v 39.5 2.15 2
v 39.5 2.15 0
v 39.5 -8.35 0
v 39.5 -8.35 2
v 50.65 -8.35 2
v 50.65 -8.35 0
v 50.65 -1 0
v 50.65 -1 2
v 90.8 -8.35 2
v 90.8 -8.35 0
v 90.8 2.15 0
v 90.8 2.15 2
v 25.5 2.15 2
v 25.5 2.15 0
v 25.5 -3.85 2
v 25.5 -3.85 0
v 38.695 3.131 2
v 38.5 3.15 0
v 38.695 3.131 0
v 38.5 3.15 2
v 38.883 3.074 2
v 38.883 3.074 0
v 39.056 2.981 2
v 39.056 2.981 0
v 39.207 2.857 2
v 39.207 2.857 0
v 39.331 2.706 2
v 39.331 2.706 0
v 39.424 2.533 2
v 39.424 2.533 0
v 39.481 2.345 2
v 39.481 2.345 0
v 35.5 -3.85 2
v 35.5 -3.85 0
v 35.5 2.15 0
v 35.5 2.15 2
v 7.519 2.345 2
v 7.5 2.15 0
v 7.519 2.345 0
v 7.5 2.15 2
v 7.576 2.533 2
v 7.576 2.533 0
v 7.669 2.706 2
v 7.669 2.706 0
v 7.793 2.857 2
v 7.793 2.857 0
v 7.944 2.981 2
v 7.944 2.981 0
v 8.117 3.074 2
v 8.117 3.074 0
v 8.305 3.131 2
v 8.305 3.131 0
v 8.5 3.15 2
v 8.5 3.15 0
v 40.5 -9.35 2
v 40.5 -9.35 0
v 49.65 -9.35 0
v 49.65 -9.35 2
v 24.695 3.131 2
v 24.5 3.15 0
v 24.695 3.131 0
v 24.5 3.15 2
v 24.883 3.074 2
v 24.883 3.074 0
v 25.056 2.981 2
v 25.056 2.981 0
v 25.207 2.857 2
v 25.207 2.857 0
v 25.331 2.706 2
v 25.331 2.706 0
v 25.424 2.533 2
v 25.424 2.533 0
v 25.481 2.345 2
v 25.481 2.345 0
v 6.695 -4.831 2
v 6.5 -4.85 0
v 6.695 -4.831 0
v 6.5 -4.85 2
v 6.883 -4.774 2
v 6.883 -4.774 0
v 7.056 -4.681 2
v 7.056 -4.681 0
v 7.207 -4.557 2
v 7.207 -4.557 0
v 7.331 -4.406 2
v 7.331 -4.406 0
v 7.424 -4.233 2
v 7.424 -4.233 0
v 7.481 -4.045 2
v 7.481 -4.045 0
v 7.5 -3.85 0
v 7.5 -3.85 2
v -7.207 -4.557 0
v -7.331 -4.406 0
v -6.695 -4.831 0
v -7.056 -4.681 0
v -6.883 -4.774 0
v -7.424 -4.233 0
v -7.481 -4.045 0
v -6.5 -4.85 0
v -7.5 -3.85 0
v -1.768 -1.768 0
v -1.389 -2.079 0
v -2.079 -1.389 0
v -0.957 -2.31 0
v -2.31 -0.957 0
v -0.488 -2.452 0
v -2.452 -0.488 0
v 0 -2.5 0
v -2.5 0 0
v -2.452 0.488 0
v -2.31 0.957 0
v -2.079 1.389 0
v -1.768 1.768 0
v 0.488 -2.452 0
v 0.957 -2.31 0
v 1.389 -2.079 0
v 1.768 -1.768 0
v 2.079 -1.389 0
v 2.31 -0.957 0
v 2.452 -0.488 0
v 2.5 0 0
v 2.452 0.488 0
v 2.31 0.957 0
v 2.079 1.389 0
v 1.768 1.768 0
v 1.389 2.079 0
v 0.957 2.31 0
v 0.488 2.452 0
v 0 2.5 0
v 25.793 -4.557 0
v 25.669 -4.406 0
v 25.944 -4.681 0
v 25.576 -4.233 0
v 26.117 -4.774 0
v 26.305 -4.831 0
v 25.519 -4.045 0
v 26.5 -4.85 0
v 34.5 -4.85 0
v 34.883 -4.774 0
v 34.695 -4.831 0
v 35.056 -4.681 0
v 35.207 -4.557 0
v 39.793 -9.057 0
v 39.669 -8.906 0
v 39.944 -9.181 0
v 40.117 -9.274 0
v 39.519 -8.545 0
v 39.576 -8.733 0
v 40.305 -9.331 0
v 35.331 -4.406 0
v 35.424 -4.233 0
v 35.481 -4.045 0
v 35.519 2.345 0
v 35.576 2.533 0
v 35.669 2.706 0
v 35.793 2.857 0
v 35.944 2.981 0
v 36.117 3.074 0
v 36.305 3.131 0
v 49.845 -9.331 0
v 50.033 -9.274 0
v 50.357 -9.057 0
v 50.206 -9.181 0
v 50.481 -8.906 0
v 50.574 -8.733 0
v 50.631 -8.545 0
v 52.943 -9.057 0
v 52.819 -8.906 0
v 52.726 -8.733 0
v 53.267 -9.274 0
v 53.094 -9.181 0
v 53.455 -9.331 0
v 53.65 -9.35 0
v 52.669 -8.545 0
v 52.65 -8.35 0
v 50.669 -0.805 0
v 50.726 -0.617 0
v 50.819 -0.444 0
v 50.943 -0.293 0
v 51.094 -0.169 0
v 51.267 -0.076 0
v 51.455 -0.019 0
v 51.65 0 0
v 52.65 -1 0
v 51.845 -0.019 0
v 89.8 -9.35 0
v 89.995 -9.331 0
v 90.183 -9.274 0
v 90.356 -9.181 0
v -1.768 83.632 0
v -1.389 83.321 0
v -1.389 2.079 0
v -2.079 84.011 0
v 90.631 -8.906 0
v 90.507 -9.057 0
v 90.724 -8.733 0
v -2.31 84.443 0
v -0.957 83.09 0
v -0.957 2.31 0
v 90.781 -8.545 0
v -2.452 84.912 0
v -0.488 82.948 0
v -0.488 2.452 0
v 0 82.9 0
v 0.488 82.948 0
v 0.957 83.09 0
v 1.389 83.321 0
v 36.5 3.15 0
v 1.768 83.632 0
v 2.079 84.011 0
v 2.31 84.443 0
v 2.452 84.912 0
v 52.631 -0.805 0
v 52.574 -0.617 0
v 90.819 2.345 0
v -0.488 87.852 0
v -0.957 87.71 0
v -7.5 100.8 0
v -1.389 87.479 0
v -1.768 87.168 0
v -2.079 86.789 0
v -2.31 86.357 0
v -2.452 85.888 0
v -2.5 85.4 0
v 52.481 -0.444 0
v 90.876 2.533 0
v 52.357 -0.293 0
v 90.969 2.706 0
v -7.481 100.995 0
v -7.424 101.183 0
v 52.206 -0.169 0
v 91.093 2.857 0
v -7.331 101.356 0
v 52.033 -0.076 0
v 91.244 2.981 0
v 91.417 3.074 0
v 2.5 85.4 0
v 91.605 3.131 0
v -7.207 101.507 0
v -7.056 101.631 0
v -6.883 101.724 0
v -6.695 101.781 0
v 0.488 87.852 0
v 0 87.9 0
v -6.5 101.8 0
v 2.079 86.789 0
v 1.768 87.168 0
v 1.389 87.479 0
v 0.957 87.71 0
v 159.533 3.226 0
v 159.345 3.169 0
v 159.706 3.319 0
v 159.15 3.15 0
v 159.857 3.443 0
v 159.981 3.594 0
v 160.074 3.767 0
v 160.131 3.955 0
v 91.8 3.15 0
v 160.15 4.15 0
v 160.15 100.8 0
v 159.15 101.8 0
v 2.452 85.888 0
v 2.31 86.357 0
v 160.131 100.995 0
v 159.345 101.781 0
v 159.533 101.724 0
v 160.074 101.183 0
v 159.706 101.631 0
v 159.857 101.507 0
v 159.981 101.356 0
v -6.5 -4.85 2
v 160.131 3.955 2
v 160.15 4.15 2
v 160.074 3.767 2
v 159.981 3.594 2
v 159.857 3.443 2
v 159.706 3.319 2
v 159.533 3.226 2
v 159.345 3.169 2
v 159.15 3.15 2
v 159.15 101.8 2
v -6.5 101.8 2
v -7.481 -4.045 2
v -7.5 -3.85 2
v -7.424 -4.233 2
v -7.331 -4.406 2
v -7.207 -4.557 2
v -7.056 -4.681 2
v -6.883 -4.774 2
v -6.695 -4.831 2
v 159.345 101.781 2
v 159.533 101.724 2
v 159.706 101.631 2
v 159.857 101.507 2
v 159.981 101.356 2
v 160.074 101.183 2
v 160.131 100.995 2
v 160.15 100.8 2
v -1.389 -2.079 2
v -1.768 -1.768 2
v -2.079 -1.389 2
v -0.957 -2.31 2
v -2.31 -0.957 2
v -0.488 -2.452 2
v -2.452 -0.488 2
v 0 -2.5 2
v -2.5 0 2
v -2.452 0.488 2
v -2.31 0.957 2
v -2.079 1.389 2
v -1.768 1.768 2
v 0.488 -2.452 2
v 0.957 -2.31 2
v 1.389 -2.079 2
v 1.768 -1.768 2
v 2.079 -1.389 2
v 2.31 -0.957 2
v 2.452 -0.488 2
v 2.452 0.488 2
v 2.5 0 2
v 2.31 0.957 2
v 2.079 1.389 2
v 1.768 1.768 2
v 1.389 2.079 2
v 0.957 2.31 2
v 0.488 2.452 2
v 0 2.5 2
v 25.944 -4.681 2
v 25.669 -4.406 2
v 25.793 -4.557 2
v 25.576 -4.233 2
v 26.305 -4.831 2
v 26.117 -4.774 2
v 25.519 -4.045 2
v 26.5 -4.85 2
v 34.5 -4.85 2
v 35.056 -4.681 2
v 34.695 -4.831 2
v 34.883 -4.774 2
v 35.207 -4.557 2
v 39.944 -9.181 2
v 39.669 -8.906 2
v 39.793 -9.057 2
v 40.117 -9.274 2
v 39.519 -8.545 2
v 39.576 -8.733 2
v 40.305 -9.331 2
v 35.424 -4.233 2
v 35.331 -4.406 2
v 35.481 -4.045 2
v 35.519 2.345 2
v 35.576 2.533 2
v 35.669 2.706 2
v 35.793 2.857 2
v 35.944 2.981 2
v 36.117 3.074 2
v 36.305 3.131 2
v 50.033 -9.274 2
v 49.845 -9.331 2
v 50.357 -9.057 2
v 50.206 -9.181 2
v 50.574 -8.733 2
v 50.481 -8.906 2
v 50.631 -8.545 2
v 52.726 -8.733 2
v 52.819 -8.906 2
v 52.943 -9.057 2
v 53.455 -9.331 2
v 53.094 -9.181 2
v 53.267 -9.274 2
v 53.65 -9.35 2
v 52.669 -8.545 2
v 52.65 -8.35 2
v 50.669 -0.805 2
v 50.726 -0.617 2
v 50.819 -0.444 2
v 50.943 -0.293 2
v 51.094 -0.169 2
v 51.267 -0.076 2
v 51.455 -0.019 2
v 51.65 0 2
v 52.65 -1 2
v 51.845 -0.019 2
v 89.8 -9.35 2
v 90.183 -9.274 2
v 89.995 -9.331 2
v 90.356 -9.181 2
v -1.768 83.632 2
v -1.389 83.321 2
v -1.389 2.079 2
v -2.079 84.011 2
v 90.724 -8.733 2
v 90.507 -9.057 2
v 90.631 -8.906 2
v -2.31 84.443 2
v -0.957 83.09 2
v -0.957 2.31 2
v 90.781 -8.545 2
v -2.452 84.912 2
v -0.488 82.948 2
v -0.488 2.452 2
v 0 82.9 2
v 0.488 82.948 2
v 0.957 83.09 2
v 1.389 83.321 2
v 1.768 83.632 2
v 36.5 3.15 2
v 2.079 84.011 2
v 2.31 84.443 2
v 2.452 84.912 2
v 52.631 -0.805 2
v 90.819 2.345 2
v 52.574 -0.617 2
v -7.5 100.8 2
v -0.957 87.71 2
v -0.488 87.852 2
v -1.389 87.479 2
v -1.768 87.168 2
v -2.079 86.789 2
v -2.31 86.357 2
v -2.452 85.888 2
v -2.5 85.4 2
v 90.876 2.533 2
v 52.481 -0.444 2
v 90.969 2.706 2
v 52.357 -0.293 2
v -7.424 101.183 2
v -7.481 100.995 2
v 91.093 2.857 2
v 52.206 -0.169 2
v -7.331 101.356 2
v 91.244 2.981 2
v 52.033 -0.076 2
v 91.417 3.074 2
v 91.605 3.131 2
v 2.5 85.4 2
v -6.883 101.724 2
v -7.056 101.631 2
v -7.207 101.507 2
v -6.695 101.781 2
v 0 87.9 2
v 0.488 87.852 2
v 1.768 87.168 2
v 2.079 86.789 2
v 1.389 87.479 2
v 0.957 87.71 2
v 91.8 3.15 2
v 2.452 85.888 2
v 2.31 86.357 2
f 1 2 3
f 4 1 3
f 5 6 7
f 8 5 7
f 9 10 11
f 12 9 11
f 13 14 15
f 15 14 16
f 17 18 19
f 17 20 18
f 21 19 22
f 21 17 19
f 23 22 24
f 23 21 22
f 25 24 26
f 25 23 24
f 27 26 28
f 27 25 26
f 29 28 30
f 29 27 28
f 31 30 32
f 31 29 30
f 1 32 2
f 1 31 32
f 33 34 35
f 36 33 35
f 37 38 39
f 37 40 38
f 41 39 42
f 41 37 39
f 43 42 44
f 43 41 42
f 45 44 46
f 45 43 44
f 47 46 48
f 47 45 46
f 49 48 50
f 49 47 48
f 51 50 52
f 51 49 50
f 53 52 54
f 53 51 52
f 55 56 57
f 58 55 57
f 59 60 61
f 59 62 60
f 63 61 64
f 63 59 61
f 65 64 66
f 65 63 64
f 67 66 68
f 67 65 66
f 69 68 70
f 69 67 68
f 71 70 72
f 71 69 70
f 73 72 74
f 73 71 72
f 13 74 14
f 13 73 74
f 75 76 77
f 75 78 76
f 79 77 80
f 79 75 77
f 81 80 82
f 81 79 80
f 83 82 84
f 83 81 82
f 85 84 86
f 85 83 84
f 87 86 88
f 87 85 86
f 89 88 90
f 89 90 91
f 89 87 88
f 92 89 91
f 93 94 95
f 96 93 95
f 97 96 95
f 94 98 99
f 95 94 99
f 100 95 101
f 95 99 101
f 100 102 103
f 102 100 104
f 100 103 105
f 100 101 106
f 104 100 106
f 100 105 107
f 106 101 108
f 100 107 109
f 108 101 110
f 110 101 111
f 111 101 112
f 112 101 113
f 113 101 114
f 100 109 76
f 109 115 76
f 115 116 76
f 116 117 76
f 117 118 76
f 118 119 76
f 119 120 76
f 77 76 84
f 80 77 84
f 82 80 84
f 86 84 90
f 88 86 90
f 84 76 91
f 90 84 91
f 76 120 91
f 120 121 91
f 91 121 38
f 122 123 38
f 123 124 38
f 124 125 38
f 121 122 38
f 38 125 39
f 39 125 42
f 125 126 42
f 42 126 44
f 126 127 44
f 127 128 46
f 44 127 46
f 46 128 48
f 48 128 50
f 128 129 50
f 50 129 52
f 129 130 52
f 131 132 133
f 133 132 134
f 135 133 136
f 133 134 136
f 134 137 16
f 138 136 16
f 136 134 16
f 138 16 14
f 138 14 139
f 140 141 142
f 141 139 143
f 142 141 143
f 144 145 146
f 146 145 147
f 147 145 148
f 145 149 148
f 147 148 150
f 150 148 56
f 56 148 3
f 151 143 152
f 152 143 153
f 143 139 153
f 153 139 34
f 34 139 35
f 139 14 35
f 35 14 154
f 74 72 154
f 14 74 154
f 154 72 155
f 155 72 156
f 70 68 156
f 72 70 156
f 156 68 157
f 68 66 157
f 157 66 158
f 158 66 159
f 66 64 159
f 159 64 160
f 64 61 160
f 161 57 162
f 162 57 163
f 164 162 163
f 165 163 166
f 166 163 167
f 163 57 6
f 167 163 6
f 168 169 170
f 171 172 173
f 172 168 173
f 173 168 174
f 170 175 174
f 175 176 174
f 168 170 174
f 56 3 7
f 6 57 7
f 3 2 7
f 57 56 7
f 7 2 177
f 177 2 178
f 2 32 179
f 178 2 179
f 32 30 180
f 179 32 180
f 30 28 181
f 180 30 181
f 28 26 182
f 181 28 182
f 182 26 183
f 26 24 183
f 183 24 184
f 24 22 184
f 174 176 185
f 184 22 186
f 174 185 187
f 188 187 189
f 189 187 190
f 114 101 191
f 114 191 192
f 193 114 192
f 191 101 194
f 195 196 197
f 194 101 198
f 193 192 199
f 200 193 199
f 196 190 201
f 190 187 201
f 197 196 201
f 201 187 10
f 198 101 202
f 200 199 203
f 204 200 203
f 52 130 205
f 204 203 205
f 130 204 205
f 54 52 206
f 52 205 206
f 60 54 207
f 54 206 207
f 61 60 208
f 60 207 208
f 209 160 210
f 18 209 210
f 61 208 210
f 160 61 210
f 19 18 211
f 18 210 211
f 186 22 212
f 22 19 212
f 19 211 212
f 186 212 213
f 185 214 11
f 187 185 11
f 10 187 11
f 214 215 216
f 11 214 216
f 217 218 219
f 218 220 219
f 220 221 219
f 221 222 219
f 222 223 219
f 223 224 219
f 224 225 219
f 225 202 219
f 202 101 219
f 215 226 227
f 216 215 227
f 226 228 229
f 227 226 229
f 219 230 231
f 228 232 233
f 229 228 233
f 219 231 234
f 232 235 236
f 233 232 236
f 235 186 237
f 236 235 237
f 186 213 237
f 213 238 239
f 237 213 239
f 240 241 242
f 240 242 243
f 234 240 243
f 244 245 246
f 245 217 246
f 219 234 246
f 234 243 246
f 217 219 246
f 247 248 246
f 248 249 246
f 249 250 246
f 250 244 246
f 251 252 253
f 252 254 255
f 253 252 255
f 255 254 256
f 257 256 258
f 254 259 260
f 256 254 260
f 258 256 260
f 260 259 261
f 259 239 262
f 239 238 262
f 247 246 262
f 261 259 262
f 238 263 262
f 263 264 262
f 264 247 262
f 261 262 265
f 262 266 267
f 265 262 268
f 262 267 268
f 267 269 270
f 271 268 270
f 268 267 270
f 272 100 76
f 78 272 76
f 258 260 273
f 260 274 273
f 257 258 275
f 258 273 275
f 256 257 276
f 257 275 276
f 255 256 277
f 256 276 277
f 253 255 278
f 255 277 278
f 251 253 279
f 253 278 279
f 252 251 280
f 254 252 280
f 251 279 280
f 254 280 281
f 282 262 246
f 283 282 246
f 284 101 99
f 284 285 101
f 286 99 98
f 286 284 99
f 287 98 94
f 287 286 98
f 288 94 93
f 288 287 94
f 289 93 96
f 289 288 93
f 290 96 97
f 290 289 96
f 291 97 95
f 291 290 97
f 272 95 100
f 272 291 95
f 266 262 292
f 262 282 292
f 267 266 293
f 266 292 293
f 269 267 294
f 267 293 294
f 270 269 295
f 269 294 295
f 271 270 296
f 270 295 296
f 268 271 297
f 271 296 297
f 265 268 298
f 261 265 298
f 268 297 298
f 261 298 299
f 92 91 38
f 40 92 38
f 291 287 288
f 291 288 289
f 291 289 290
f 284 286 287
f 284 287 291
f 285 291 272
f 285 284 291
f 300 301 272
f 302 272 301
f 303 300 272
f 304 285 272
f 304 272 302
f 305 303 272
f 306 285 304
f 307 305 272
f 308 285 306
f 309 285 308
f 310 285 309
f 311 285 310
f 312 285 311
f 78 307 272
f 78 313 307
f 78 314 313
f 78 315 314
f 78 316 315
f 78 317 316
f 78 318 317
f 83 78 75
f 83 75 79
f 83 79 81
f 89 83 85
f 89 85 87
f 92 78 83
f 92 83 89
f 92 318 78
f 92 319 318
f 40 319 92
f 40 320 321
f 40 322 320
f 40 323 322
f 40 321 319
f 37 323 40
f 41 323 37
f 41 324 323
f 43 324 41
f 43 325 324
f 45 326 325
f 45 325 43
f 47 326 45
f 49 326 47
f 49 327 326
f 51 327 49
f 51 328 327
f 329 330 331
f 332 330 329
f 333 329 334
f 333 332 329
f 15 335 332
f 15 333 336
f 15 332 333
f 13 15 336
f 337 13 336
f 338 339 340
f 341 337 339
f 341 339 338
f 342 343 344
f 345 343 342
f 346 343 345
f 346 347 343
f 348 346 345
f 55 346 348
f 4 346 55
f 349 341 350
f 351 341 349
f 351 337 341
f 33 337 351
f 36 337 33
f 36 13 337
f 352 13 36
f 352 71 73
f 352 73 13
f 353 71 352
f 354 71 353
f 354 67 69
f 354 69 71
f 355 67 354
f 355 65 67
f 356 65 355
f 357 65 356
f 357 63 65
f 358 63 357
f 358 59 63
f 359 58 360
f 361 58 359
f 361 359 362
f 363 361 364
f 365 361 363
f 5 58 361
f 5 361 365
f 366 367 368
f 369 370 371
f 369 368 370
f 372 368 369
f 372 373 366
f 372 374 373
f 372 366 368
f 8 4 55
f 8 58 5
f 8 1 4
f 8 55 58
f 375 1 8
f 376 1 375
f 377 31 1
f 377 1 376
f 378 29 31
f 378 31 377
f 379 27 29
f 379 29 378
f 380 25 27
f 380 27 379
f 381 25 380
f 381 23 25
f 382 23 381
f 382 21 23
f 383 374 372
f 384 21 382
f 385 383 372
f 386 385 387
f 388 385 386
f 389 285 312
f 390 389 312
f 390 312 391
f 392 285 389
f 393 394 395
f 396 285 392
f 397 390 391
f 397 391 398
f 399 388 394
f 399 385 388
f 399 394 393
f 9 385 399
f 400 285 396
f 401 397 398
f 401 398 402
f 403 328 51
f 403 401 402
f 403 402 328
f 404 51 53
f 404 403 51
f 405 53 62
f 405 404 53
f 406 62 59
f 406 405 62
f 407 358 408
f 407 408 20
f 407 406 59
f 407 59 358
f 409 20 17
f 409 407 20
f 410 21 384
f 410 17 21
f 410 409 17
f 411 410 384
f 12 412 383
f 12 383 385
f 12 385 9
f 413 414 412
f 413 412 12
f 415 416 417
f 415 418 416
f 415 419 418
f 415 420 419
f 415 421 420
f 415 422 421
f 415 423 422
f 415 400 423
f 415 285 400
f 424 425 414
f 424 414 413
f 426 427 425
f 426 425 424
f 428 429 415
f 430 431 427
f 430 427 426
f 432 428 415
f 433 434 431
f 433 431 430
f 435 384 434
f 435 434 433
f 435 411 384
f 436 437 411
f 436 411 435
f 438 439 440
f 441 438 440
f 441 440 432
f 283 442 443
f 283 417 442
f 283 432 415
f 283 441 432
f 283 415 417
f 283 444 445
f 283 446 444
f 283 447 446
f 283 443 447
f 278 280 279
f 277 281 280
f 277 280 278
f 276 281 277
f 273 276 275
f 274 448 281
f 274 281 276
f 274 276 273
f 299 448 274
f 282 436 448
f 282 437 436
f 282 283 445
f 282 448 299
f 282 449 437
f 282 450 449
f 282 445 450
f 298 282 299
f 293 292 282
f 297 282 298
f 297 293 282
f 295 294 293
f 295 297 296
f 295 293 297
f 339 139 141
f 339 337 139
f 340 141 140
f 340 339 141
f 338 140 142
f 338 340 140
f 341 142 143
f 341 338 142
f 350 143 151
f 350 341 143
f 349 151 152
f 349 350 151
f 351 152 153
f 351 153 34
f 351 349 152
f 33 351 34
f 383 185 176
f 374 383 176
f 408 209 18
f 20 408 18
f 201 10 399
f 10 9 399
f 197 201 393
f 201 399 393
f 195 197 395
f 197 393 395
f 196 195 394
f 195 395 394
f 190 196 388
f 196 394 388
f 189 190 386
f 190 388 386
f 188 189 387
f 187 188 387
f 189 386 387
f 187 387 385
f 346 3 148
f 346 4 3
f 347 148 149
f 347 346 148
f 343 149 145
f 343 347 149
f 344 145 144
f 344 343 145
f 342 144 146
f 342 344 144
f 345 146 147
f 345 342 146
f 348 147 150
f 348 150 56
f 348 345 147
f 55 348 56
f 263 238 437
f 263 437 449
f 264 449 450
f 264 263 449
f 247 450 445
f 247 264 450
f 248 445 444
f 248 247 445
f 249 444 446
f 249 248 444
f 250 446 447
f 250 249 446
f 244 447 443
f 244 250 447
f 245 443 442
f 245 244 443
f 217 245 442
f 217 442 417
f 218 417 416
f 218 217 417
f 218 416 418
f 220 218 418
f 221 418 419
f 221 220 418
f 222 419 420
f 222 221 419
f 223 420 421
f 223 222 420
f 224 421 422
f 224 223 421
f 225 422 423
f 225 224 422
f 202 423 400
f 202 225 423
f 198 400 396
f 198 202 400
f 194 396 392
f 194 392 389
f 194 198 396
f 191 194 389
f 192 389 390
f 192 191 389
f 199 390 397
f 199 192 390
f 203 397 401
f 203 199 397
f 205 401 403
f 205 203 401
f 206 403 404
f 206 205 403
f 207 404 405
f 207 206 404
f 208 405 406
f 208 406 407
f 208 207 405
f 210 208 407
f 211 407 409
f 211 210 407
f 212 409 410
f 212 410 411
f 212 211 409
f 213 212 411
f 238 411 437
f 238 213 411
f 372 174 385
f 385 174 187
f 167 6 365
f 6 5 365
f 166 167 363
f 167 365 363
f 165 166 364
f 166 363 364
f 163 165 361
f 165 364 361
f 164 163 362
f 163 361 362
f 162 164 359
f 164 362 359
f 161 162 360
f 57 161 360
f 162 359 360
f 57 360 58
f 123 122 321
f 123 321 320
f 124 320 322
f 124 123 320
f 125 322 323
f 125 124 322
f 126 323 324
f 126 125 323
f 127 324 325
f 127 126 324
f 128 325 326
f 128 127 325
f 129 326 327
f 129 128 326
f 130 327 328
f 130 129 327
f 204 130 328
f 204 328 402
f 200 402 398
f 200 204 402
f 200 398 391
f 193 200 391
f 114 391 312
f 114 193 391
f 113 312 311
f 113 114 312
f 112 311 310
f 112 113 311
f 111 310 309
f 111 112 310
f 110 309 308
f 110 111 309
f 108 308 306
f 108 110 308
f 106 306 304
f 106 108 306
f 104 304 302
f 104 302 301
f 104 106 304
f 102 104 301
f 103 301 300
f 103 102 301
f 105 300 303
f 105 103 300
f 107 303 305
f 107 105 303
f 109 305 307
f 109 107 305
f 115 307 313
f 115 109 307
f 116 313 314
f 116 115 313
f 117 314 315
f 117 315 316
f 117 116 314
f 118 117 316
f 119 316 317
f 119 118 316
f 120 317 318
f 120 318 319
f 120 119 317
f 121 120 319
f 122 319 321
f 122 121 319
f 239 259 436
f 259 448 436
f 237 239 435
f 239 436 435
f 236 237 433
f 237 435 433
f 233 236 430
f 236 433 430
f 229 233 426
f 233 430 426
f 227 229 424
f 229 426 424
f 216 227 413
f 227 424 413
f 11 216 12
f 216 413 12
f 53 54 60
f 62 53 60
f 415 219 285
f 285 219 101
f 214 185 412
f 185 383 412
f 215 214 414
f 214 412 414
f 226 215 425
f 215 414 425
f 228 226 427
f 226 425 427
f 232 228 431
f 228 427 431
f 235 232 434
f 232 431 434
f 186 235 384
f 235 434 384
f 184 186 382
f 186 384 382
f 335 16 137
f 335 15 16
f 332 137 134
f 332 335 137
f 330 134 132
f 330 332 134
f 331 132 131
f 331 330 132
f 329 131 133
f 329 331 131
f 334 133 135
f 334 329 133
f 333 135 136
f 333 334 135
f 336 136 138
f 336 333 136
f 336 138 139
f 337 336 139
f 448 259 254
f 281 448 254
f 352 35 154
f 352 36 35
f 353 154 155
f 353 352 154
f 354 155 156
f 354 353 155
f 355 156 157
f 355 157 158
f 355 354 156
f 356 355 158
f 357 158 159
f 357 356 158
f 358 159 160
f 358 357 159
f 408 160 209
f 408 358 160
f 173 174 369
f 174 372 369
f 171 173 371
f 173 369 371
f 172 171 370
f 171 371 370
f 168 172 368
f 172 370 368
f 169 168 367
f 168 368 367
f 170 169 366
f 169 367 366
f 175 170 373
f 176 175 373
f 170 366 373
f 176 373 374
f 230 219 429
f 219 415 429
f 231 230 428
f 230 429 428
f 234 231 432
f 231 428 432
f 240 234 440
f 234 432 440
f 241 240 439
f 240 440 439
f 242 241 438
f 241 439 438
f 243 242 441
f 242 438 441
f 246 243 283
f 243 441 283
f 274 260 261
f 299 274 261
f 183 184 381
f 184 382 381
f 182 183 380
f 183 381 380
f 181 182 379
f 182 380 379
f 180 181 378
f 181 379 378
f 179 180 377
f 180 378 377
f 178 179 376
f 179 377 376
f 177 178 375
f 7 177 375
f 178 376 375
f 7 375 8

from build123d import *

# Parameters (mm, degrees)
F0_R     = 2.5
F1_DEPTH = 2
F2_R     = 0.99999


# Not quite as in the source:
# - a fillet or chamfer is up to 0.001 mm smaller than in the source, because OpenCascade refuses the exact size


with BuildPart() as f1:
    # F0 (on Top) → F1 (new body)
    with BuildSketch(Plane.XY):
        Polygon((-7.5, 101.8), (-7.5, -4.85), (7.5, -4.85), (7.5, 3.15), (25.5, 3.15), (25.5, -4.85), (35.5, -4.85), (35.5, 3.15), (39.5, 3.15), (39.5, -9.35), (50.65, -9.35), (50.65, 0), (52.65, 0), (52.65, -9.35), (90.8, -9.35), (90.8, 3.15), (160.15, 3.15), (160.15, 101.8), align=None)
        Circle(F0_R, mode=Mode.SUBTRACT)
        with Locations((0, 85.4)):
            Circle(F0_R, mode=Mode.SUBTRACT)
    extrude(amount=F1_DEPTH)

    # F2 (radius 1 in the source; OpenCascade refuses exactly that, so slightly less here)
    f2_edges = [f1.edges().sort_by_distance(p)[0] for p in [
        (-7.5, -4.85, 1),
        (7.5, -4.85, 1),
        (25.5, 3.15, 1),
        (25.5, -4.85, 1),
        (35.5, -4.85, 1),
        (39.5, 3.15, 1),
        (39.5, -9.35, 1),
        (50.65, -9.35, 1),
        (52.65, 0, 1),
        (52.65, -9.35, 1),
        (90.8, -9.35, 1),
        (-7.5, 101.8, 1),
        (160.15, 101.8, 1),
        (160.15, 3.15, 1),
        (90.8, 3.15, 1),
        (35.5, 3.15, 1),
        (7.5, 3.15, 1),
        (50.65, 0, 1),
    ]]
    fillet(f2_edges, radius=F2_R)


solid = f1.part
